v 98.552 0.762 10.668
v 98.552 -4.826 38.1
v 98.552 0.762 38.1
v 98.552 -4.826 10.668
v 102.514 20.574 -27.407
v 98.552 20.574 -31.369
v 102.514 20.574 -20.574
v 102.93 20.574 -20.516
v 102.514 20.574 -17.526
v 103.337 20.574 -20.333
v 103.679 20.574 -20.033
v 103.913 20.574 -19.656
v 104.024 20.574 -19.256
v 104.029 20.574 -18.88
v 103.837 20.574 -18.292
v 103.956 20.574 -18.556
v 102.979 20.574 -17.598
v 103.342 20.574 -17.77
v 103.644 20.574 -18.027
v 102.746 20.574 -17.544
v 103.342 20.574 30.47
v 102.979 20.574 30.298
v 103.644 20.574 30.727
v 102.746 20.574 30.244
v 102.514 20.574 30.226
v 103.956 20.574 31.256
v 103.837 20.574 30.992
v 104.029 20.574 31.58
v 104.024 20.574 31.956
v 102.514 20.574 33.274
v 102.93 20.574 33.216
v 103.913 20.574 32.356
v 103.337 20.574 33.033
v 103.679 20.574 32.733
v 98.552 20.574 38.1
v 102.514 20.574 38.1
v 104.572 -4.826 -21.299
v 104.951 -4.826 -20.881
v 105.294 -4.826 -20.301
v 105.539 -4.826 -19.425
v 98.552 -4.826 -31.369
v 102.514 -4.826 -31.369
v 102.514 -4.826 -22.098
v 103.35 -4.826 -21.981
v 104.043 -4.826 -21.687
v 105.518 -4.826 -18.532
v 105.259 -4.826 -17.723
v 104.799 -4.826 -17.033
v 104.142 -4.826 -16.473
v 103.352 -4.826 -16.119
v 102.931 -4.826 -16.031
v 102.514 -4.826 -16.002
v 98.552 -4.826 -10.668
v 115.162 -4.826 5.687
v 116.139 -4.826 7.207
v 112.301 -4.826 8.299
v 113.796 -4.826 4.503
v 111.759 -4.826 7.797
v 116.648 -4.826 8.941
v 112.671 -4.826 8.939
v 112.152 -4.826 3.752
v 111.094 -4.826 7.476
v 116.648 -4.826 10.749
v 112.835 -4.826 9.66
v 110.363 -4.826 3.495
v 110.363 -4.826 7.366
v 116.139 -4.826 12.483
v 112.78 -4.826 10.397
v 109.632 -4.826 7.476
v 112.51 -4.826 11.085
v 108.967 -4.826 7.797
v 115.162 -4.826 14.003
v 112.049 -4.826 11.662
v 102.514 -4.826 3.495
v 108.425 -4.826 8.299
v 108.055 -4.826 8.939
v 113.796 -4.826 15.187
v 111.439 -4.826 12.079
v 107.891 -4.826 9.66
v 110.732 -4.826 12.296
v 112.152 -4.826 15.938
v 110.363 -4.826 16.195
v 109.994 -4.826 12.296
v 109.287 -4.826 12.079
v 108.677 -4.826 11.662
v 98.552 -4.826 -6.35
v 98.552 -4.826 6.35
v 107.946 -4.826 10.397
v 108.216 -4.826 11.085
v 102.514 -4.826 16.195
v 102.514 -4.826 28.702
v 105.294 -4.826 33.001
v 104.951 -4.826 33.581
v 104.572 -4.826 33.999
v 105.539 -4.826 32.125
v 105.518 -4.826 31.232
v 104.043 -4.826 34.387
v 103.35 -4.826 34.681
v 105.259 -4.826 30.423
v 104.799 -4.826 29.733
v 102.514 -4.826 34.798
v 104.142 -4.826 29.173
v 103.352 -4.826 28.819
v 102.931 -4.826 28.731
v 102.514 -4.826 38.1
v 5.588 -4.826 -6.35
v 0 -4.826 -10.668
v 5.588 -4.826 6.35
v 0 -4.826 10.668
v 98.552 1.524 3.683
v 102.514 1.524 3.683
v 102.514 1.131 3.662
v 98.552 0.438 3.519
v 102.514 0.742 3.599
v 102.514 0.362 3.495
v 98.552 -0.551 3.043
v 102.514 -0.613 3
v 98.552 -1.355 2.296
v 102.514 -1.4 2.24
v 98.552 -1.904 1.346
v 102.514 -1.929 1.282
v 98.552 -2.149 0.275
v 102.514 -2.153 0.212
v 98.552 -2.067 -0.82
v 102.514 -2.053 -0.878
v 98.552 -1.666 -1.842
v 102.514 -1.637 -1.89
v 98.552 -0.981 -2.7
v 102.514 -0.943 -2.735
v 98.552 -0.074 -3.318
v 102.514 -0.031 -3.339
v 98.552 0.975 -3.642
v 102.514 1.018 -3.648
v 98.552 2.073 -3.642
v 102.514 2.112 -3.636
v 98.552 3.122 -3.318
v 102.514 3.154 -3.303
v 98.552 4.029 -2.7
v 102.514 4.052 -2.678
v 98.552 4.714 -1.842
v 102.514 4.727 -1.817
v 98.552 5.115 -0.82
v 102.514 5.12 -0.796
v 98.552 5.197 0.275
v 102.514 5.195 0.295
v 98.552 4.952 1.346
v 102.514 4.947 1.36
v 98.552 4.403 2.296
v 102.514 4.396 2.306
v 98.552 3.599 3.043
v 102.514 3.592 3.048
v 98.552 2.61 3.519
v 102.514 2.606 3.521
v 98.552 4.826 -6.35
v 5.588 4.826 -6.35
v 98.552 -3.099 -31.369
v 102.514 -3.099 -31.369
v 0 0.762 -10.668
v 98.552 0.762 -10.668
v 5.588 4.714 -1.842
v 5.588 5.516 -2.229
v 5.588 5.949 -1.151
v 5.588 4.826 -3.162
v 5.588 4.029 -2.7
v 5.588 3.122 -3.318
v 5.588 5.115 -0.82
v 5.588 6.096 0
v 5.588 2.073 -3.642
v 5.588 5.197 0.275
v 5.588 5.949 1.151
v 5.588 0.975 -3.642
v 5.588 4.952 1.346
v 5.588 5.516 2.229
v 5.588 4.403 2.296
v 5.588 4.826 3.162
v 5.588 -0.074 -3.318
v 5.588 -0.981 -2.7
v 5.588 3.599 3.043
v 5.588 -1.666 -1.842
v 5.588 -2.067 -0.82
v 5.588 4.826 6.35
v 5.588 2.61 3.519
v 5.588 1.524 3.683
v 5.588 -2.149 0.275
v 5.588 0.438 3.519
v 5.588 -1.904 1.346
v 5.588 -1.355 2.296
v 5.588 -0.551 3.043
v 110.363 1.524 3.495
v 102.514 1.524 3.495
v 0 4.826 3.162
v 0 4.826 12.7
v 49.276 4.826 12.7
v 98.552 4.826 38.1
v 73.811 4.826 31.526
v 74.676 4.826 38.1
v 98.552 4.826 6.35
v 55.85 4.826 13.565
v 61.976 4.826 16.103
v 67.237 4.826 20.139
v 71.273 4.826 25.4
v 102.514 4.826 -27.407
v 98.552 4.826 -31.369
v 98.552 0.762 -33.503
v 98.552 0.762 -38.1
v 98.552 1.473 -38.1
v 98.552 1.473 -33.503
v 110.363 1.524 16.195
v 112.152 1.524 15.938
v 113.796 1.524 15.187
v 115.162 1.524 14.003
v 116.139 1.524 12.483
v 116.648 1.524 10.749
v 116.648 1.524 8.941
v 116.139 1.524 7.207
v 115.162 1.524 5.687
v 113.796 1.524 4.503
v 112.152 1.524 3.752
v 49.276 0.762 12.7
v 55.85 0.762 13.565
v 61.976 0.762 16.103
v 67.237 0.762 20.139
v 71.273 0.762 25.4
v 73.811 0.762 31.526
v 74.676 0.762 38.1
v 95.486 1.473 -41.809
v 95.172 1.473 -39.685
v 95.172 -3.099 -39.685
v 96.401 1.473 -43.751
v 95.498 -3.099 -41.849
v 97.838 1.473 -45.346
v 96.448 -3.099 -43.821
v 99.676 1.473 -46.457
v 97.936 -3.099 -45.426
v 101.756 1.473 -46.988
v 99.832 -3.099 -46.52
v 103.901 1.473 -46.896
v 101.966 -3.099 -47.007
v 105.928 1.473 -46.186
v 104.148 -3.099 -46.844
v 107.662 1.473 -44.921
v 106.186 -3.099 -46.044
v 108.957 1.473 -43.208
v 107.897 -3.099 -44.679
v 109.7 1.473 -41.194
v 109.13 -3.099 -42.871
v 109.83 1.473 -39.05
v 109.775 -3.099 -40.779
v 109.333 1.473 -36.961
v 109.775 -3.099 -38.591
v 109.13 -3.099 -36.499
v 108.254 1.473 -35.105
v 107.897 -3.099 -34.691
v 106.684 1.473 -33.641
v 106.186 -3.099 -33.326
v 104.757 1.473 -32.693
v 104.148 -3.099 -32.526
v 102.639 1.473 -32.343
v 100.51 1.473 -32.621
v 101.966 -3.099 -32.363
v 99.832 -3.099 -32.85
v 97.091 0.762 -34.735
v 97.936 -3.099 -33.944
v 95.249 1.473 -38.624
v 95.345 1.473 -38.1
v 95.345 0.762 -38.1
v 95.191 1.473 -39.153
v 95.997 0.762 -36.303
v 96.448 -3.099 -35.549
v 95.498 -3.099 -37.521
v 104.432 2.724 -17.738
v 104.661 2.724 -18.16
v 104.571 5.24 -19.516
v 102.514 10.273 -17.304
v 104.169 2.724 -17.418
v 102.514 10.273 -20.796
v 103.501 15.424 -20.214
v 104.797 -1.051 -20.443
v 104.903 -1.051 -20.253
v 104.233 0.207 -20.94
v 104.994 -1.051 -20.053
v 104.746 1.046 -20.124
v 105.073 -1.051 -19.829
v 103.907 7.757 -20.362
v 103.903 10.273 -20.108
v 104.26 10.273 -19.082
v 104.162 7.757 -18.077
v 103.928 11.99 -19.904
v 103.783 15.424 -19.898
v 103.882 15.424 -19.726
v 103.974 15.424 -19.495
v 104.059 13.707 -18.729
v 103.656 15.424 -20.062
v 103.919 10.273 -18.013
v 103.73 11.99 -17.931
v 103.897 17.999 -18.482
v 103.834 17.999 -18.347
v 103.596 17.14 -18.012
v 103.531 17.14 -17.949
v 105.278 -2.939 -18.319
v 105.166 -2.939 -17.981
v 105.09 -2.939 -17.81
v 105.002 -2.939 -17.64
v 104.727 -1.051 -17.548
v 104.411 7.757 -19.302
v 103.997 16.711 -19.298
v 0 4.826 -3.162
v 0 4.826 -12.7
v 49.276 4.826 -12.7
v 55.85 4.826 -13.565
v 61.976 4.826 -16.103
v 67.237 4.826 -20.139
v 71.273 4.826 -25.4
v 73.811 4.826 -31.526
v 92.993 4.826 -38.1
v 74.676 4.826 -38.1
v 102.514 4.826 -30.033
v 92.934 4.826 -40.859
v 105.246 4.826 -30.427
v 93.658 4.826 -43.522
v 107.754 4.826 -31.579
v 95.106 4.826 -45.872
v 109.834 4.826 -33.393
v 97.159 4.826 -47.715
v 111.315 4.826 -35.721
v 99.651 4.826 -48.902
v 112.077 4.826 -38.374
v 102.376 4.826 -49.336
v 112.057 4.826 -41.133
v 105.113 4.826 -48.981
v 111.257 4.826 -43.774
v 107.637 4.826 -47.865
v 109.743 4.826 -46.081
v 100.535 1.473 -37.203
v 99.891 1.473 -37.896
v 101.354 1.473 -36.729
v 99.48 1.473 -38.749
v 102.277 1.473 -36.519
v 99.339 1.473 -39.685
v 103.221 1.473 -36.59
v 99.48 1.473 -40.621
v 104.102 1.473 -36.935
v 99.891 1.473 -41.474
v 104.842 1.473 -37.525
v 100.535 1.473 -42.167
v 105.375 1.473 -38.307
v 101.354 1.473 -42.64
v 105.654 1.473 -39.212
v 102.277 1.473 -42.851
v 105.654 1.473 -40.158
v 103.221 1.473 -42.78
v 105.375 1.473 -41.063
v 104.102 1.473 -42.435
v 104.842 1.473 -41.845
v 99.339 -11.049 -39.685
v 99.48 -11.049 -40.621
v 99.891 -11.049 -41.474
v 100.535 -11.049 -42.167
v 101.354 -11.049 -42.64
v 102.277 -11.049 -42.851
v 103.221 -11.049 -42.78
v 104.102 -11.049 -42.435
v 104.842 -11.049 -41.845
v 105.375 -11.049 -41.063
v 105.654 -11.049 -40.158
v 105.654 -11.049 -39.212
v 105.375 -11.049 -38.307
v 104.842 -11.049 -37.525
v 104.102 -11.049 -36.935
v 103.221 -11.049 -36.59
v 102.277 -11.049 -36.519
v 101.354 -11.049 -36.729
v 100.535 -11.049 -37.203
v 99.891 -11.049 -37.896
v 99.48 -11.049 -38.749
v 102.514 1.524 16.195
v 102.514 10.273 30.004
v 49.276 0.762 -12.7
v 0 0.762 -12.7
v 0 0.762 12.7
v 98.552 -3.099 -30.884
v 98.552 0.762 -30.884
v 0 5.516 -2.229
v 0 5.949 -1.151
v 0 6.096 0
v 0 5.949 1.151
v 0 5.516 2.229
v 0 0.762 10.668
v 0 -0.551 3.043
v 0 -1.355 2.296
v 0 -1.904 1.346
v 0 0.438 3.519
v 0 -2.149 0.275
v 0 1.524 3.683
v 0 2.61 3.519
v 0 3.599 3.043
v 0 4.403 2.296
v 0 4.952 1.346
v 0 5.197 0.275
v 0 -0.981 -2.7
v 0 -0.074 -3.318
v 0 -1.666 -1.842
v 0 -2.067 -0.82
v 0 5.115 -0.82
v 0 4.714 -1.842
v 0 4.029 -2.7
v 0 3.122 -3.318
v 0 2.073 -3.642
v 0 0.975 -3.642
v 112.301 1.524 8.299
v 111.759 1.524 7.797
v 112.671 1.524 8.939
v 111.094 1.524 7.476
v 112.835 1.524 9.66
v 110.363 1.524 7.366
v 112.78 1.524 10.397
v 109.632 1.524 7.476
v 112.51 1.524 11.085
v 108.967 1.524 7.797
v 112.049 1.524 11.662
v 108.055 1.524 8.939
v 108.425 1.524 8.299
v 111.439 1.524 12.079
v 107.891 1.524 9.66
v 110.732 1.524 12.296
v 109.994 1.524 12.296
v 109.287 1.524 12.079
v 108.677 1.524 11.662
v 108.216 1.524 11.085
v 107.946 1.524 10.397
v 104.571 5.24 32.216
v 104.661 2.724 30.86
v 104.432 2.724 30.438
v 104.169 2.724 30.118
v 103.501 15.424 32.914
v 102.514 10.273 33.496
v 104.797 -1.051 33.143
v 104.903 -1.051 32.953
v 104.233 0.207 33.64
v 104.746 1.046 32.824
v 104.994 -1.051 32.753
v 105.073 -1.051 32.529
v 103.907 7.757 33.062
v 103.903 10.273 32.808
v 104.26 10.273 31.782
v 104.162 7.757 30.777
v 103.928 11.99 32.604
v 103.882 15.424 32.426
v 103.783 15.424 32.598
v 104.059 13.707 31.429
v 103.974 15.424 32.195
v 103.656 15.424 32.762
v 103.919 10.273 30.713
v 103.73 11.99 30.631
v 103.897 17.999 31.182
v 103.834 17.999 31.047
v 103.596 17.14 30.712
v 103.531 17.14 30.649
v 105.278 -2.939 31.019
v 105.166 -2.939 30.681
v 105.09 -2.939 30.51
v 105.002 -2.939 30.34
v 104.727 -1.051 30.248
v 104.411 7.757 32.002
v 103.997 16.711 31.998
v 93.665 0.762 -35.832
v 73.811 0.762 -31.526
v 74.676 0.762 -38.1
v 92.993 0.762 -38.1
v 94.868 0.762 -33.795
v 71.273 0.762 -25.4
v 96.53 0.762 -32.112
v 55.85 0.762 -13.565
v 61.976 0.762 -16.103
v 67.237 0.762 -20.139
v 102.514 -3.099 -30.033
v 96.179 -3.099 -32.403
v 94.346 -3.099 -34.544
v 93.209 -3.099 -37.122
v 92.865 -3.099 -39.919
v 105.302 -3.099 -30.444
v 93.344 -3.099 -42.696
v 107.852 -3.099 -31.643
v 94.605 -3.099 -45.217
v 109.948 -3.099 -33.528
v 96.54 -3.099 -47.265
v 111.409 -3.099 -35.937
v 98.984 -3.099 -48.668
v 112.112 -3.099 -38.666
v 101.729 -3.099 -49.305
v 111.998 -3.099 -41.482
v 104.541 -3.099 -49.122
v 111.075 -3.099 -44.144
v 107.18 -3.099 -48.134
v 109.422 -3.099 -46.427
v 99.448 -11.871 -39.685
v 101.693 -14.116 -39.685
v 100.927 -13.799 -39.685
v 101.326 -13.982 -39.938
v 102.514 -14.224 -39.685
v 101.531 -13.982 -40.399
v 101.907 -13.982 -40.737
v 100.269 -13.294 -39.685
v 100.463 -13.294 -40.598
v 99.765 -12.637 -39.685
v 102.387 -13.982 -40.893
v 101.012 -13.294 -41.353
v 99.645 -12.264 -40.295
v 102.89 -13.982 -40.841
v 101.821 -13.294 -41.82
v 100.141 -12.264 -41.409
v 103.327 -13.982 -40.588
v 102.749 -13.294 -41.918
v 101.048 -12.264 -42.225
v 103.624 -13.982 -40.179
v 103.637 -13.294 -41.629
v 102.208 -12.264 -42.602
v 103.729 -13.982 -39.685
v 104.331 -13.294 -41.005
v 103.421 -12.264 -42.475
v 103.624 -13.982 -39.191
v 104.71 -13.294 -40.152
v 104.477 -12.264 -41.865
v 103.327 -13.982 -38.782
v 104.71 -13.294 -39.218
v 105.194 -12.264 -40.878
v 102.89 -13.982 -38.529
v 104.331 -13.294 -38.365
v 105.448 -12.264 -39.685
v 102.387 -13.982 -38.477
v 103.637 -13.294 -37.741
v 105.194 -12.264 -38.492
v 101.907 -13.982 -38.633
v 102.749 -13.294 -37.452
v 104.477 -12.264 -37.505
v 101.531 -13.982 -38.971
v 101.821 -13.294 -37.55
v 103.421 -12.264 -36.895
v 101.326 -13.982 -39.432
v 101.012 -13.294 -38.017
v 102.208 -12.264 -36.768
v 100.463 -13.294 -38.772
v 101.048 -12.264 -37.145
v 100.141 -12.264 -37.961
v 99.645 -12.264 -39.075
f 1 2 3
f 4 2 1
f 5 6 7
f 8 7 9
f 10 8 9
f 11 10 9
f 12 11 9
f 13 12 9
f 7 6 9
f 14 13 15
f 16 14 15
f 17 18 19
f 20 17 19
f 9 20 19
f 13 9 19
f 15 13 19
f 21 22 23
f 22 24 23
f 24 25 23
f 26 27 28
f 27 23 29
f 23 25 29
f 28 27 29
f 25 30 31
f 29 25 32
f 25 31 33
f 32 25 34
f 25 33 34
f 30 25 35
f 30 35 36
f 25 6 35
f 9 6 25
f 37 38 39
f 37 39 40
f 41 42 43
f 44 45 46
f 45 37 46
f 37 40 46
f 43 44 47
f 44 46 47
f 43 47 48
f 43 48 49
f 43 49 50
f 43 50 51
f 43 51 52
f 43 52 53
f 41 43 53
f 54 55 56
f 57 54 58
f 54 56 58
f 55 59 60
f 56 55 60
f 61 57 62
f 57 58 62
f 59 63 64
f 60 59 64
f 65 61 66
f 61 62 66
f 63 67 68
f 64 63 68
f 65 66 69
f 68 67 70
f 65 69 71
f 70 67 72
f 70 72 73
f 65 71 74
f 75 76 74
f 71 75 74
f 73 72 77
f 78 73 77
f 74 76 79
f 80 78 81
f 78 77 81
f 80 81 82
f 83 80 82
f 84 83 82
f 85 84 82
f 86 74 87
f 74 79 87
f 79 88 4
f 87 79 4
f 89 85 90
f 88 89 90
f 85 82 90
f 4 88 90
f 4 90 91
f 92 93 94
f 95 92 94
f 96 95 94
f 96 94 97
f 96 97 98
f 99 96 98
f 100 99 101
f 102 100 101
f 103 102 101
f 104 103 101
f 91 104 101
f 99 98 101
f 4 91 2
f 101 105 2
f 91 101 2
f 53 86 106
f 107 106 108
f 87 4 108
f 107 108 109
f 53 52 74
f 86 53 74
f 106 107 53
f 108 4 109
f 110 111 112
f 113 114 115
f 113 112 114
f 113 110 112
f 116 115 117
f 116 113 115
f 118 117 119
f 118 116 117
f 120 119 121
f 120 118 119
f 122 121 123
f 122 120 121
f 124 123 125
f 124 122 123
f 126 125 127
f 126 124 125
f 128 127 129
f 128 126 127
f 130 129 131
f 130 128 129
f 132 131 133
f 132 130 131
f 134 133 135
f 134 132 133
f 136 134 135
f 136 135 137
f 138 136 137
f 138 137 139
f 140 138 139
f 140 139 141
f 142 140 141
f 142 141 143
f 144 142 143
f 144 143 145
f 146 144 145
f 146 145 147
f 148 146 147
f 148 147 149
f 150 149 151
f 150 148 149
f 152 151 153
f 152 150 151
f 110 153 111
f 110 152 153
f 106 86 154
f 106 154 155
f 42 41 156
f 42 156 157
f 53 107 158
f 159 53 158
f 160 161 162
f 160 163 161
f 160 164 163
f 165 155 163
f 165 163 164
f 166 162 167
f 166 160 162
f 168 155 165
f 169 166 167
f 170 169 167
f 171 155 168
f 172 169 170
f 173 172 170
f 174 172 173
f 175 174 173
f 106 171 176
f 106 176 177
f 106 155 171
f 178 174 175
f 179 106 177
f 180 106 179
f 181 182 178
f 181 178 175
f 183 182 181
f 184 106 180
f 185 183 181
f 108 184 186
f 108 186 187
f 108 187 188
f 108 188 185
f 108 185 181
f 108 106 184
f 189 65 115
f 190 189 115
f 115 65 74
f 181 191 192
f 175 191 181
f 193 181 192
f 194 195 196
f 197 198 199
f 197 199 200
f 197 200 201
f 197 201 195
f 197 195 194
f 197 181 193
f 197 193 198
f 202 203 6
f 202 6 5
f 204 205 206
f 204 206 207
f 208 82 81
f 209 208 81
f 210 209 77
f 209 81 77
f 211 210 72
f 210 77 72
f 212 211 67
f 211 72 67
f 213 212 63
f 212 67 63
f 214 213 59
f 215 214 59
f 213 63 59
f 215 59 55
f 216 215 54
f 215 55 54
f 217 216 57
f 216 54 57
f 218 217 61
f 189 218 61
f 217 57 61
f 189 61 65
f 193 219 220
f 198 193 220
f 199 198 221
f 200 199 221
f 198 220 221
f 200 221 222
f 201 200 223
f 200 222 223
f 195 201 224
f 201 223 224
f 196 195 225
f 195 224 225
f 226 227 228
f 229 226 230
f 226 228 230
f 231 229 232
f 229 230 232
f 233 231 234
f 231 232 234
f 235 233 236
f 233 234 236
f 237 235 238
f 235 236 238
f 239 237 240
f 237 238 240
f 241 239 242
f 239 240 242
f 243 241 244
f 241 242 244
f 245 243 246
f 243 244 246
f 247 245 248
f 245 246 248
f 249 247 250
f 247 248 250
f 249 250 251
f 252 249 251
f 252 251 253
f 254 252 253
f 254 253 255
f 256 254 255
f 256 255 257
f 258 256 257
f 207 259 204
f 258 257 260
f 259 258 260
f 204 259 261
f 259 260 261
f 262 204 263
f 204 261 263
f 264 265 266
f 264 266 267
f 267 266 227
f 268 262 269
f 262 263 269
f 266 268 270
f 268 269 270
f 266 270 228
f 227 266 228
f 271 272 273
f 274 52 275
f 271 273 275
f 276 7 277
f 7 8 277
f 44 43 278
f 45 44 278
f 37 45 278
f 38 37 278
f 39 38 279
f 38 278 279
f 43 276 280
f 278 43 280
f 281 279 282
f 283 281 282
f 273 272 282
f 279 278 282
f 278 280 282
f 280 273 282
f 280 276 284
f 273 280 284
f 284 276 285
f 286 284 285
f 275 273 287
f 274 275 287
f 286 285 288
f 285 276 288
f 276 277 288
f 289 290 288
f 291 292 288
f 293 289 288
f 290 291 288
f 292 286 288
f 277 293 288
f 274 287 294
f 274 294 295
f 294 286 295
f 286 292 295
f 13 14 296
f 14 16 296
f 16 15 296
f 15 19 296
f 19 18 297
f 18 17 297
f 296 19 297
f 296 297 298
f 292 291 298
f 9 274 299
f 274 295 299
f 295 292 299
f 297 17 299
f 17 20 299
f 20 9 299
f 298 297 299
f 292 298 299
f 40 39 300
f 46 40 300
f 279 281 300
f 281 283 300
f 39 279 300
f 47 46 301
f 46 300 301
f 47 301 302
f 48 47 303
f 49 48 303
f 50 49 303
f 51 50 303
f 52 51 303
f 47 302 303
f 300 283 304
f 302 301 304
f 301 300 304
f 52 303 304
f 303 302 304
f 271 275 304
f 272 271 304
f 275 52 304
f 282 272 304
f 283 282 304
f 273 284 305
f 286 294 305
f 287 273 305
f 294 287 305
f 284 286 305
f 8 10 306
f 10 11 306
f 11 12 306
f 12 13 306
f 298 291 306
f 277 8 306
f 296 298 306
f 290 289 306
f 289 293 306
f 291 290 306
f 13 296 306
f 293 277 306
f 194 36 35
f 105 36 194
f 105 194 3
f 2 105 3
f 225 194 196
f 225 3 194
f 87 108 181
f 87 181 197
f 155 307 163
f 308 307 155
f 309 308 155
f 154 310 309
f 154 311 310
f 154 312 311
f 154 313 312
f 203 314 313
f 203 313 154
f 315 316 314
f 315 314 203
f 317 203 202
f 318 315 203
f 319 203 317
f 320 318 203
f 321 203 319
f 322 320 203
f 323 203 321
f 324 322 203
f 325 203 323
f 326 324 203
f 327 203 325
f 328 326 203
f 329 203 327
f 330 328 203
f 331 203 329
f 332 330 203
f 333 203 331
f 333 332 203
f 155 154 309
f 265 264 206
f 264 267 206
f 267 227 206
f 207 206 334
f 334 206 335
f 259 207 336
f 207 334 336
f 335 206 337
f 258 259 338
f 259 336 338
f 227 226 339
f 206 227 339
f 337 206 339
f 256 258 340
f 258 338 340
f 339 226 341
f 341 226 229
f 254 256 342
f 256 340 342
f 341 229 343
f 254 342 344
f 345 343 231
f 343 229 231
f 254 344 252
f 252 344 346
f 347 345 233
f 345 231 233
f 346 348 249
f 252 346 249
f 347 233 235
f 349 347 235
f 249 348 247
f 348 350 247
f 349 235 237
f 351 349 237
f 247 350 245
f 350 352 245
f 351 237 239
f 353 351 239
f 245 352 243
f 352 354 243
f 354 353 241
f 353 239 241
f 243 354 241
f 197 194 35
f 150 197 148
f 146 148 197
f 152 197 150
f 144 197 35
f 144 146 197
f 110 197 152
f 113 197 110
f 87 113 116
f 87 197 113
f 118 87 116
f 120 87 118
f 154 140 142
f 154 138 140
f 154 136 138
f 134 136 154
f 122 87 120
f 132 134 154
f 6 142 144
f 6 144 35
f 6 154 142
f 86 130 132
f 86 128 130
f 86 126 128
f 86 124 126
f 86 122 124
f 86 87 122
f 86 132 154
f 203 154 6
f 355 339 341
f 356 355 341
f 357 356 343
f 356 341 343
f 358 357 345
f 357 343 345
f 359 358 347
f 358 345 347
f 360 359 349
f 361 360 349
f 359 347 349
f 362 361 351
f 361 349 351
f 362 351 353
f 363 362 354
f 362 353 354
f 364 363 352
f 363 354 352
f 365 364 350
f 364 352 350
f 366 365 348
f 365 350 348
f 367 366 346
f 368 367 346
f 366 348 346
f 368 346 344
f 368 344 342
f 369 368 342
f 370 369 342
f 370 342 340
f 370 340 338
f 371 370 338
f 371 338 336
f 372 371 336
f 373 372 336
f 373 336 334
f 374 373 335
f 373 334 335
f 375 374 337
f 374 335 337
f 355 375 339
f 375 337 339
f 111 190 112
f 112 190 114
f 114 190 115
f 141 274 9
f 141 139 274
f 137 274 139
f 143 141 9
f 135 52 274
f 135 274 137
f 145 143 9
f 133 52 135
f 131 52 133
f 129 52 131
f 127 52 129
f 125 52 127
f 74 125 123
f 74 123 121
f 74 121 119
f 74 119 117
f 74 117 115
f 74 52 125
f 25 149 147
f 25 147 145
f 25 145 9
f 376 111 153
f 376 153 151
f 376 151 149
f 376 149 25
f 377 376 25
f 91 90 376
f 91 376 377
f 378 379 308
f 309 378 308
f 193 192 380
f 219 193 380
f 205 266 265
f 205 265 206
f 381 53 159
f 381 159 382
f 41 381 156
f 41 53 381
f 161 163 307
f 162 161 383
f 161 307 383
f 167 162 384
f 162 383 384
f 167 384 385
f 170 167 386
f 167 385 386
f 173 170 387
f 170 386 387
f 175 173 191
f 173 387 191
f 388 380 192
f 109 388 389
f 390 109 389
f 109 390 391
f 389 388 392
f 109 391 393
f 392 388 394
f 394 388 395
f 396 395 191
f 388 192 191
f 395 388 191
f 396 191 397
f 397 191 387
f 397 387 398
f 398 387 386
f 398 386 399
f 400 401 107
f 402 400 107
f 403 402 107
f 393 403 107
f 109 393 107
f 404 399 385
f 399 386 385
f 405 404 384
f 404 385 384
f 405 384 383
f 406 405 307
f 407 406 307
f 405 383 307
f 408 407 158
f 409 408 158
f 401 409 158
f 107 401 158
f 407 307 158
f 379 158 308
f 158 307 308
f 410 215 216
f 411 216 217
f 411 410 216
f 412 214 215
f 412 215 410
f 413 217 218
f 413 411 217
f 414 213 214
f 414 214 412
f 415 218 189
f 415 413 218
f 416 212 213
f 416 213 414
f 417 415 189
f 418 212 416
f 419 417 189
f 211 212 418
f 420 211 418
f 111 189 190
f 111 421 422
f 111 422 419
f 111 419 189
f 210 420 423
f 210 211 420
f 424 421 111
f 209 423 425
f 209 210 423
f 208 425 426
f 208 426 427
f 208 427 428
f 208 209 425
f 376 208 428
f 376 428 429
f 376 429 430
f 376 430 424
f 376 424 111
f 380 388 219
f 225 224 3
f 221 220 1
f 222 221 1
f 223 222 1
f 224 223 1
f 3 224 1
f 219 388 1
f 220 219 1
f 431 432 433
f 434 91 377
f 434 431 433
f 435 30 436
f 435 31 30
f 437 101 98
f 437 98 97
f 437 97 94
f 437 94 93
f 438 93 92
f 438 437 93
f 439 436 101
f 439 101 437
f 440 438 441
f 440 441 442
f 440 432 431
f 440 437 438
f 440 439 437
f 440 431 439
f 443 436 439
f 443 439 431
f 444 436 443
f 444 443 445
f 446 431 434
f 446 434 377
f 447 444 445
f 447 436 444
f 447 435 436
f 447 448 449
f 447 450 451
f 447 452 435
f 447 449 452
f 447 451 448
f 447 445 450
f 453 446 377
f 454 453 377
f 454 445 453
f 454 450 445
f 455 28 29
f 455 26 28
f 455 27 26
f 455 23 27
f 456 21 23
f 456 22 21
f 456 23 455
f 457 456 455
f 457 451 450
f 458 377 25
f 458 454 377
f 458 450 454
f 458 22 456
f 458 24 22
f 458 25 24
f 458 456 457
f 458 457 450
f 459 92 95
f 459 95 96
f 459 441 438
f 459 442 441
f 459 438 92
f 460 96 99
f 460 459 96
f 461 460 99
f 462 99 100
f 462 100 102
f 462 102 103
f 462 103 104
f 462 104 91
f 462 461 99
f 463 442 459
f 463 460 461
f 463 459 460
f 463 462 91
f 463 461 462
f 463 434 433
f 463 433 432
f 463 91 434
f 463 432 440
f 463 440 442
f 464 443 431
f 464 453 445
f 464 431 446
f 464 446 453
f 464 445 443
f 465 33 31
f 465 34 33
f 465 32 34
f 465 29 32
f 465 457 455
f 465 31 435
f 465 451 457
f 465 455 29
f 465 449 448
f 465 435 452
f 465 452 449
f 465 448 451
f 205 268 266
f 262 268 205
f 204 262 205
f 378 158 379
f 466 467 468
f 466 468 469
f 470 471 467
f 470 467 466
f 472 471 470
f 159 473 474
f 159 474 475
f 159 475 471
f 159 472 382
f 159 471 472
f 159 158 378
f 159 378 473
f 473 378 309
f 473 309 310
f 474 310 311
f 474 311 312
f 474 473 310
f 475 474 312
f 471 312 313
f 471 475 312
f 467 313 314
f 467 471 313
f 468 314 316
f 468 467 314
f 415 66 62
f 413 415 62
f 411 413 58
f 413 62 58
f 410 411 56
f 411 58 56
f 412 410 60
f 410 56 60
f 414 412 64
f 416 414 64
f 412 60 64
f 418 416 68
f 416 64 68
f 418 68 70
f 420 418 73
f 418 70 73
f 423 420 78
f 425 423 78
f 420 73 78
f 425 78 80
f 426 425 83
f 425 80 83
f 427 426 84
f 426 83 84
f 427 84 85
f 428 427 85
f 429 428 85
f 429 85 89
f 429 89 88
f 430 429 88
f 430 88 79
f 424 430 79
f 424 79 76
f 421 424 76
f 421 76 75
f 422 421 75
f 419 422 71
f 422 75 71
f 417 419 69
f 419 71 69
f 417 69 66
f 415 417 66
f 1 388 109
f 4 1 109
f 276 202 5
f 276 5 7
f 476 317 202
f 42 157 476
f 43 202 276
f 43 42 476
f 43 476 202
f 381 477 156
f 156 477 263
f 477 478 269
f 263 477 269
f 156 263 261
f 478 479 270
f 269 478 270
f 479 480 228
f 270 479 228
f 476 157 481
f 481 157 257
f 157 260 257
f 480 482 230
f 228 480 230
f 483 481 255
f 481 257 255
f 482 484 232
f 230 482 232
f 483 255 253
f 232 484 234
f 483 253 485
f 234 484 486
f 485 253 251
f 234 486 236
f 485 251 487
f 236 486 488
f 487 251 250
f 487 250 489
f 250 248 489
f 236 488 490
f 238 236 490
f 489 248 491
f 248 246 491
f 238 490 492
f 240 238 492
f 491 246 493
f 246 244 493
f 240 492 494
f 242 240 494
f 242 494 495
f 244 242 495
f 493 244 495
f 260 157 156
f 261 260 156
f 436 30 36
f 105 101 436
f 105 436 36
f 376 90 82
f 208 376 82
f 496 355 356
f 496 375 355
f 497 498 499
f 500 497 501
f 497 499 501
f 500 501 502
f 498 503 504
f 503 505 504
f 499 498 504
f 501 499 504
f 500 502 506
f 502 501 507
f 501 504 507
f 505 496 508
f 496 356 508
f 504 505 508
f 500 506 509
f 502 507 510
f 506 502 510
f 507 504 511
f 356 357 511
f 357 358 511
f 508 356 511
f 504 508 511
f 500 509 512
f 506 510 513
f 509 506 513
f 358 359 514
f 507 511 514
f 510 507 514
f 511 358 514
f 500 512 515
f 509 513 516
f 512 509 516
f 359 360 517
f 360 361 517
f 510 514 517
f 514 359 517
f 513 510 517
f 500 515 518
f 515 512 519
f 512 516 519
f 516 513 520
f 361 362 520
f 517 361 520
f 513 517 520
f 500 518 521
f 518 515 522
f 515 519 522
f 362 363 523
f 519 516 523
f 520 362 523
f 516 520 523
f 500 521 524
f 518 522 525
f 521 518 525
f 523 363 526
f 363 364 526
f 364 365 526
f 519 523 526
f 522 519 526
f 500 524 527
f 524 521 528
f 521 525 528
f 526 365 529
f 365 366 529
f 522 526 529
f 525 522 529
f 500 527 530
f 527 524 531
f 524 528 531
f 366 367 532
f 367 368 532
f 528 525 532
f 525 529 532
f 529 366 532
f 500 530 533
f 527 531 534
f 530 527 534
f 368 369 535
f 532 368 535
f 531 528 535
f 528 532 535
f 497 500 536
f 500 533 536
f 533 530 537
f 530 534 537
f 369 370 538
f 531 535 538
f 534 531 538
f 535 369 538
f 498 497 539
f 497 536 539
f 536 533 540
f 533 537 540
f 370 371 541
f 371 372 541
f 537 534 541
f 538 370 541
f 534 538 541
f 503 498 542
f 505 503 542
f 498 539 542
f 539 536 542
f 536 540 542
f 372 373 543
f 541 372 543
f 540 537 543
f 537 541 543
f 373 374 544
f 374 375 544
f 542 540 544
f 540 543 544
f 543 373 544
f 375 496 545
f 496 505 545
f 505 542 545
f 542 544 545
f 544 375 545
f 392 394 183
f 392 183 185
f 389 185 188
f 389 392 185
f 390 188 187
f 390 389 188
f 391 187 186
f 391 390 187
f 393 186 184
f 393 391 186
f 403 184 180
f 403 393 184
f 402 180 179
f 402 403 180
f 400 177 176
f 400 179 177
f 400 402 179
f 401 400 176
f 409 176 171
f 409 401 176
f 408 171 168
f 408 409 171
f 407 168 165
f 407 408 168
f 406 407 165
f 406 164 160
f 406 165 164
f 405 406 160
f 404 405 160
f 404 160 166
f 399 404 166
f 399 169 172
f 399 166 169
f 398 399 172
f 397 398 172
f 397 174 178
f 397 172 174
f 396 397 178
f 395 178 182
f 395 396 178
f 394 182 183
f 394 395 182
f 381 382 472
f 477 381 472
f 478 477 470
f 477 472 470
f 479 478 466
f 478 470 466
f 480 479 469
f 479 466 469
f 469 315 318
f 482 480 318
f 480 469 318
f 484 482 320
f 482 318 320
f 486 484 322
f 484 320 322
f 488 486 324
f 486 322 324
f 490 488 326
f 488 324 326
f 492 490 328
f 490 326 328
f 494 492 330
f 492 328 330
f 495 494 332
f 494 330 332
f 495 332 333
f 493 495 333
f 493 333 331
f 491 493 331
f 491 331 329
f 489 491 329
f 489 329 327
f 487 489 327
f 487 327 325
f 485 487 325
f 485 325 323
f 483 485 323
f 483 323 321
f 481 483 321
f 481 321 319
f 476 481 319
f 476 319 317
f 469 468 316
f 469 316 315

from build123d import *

# Parameters (mm, degrees)
BOSS_EXTRUDE1_DEPTH     = 98.552
CUT_EXTRUDE2_DEPTH      = 100.834602258
CUT_EXTRUDE2_DEPTH_BACK = 100.834602258
SKETCH2_W               = 92.964
SKETCH2_H               = 3.187725502
BOSS_EXTRUDE2_START     = -4.064
BOSS_EXTRUDE2_DEPTH     = 4.064
BOSS_EXTRUDE3_DEPTH     = 25.4
CUT_EXTRUDE3_DEPTH      = 109.948520702
CUT_EXTRUDE3_DEPTH_BACK = 109.948520702
SKETCH9_R               = 3.683
SKETCH11_R              = 2.47904
BOSS_EXTRUDE4_DEPTH     = 6.35
FILLET1_R               = 3.175
CUT_EXTRUDE4_DEPTH      = 15.748


with BuildPart() as part:
    # Sketch1 → Boss-Extrude1 (new body)
    with BuildSketch(Plane(origin=(0, 0, 0), x_dir=(0, 0, -1), z_dir=(1, 0, 0))):
        with BuildLine():
            Line((-10.668, -4.826), (10.668, -4.826))
            Line((10.668, -4.826), (10.668, 0.762))
            Line((10.668, 0.762), (12.7, 0.762))
            Line((12.7, 0.762), (12.7, 4.826))
            Line((12.7, 4.826), (3.162274498, 4.826))
            ThreePointArc((3.162274498, 4.826), (0, 6.096), (-3.162274498, 4.826))
            Line((-3.162274498, 4.826), (-12.7, 4.826))
            Line((-12.7, 4.826), (-12.7, 0.762))
            Line((-12.7, 0.762), (-10.668, 0.762))
            Line((-10.668, 0.762), (-10.668, -4.826))
        make_face()
    extrude(amount=BOSS_EXTRUDE1_DEPTH)

    # Sketch2 → Cut-Extrude2 (cut, two sides: drawn at the far end of the back side and taken through both)
    with BuildSketch(Plane(origin=(0, 4.826, 0), x_dir=(1, 0, 0), z_dir=(0, 1, 0)).offset(-CUT_EXTRUDE2_DEPTH_BACK)):
        with Locations((52.07, -4.756137249)):
            Rectangle(SKETCH2_W, SKETCH2_H)
        Polygon((5.588, 6.35), (5.588, 0), (5.588, -3.162274498), (98.552, -3.162274498), (98.552, 6.35), align=None)
    extrude(amount=CUT_EXTRUDE2_DEPTH + CUT_EXTRUDE2_DEPTH_BACK, mode=Mode.SUBTRACT)

    # Sketch3 → Boss-Extrude2 (add)
    with BuildSketch(Plane(origin=(0, 4.826, 0), x_dir=(1, 0, 0), z_dir=(0, 1, 0)).offset(BOSS_EXTRUDE2_START)):
        with BuildLine():
            Line((98.552, -12.7), (49.276, -12.7))
            ThreePointArc((49.276, -12.7), (67.236512242, -20.139487758), (74.676, -38.1))
            Line((74.676, -38.1), (98.552, -38.1))
            Line((98.552, -38.1), (98.552, -12.7))
        make_face()
    boss_extrude2 = extrude(amount=BOSS_EXTRUDE2_DEPTH)

    # Mirror1: Boss-Extrude2 across plane
    add(boss_extrude2.mirror(Plane.XY))

    # Sketch5 → Boss-Extrude3 (add)
    with BuildSketch(Plane.XZ.offset(4.826)):
        Polygon((98.552, 6.35), (98.552, 0), (98.552, -6.35), (98.552, -10.668), (98.552, -31.369), (102.5144, -31.369), (102.5144, 31.75), (102.5144, 38.1), (98.552, 38.1), (98.552, 10.668), align=None)
    extrude(amount=-BOSS_EXTRUDE3_DEPTH)

    # Loft1: read off the stored shape, not the designer's step
    # Loft1: loft between two sections, ruled curve by curve
    loft1_from = [
        Edge.make_bspline([(99.920568819, -4.826, 30.149267728), (96.719104275, -4.826, 35.336930089), (101.906766636, -4.826, 38.538394633), (105.108231181, -4.826, 33.350732272), (108.309695725, -4.826, 28.163069911), (103.122033364, -4.826, 24.961605367), (99.920568819, -4.826, 30.149267728)], [0.5, 0.5, 0.5, 0.5, 1, 1, 1, 1.5, 1.5, 1.5, 1.5], 3, [1, 0.333333333, 0.333333333, 1, 0.333333333, 0.333333333, 1]),
    ]
    loft1_to = [
        Edge.make_bspline([(101.34872832, 20.574, 32.731725793), (103.312179906, 20.574, 35.063069154), (105.643523267, 20.574, 33.099617568), (103.68007168, 20.574, 30.768274207), (101.716620094, 20.574, 28.436930846), (99.385276733, 20.574, 30.400382432), (101.34872832, 20.574, 32.731725793)], [0.5, 0.5, 0.5, 0.5, 1, 1, 1, 1.5, 1.5, 1.5, 1.5], 3, [1, 0.333333333, 0.333333333, 1, 0.333333333, 0.333333333, 1]),
    ]
    loft1 = Solid(Shell([*[Face.make_surface_from_curves(loft1_from[k], loft1_to[k]) for k in range(1)], Face(Wire(loft1_from)), Face(Wire(loft1_to))]))
    add(loft1)

    # Mirror2: Loft1 across plane
    add(loft1.mirror(Plane(origin=(0, 0, 6.35), x_dir=(1, 0, 0), z_dir=(0, 0, -1))))

    # Sketch9 → Cut-Extrude3 (cut, two sides: drawn at the far end of the back side and taken through both)
    with BuildSketch(Plane(origin=(5.588, 0, 0), x_dir=(0, 0, -1), z_dir=(1, 0, 0)).offset(-CUT_EXTRUDE3_DEPTH_BACK)):
        with Locations(Location((0, 1.524, 0), (0, 0, 180))):
            Circle(SKETCH9_R)
    extrude(amount=CUT_EXTRUDE3_DEPTH + CUT_EXTRUDE3_DEPTH_BACK, mode=Mode.SUBTRACT)

    # Sketch11 → Boss-Extrude4 (add)
    with BuildSketch(Plane.XZ.offset(4.826)):
        with BuildLine():
            Line((102.5144, 16.19504), (110.363, 16.19504))
            ThreePointArc((110.363, 16.19504), (116.713, 9.84504), (110.363, 3.49504))
            Line((110.363, 3.49504), (102.5144, 3.49504))
            Line((102.5144, 3.49504), (102.5144, 9.84504))
            Line((102.5144, 9.84504), (102.5144, 16.19504))
        make_face()
        with Locations(Location((110.363, 9.84504, 0), (0, 0, 270))):
            Circle(SKETCH11_R, mode=Mode.SUBTRACT)
    extrude(amount=-BOSS_EXTRUDE4_DEPTH)

    # Sketch14 → Revolve1 (revolve)
    with BuildSketch(Plane(origin=(0, 0, -39.68496), x_dir=(-1, 0, 0), z_dir=(0, 0, -1)), mode=Mode.PRIVATE) as revolve1_sk:
        Polygon((-102.5144, 4.826), (-102.5144, -14.224), (-105.6894, -14.224), (-105.6894, 1.4732), (-109.857134902, 1.4732), (-109.857134902, -3.0988), (-112.1664, -3.0988), (-112.1664, 4.826), align=None)
    revolve(revolve1_sk.sketch.rotate(Axis((102.5144, 4.826, -39.68496), (0, -1, 0)), 180), axis=Axis((102.5144, 4.826, -39.68496), (0, -1, 0)))

    # Fillet1
    fillet1_edges = [part.edges().sort_by_distance(p)[0] for p in [
        (105.6894, -14.224, -39.68496),
    ]]
    fillet(fillet1_edges, radius=FILLET1_R)

    # Sketch15 → Cut-Extrude4 (cut)
    with BuildSketch(Plane(origin=(0, 20.574, 0), x_dir=(1, 0, 0), z_dir=(0, 1, 0))):
        Polygon((98.552, 31.369), (102.5144, 27.4066), (102.5144, 31.369), align=None)
    extrude(amount=-CUT_EXTRUDE4_DEPTH, mode=Mode.SUBTRACT)


solid = part.part
